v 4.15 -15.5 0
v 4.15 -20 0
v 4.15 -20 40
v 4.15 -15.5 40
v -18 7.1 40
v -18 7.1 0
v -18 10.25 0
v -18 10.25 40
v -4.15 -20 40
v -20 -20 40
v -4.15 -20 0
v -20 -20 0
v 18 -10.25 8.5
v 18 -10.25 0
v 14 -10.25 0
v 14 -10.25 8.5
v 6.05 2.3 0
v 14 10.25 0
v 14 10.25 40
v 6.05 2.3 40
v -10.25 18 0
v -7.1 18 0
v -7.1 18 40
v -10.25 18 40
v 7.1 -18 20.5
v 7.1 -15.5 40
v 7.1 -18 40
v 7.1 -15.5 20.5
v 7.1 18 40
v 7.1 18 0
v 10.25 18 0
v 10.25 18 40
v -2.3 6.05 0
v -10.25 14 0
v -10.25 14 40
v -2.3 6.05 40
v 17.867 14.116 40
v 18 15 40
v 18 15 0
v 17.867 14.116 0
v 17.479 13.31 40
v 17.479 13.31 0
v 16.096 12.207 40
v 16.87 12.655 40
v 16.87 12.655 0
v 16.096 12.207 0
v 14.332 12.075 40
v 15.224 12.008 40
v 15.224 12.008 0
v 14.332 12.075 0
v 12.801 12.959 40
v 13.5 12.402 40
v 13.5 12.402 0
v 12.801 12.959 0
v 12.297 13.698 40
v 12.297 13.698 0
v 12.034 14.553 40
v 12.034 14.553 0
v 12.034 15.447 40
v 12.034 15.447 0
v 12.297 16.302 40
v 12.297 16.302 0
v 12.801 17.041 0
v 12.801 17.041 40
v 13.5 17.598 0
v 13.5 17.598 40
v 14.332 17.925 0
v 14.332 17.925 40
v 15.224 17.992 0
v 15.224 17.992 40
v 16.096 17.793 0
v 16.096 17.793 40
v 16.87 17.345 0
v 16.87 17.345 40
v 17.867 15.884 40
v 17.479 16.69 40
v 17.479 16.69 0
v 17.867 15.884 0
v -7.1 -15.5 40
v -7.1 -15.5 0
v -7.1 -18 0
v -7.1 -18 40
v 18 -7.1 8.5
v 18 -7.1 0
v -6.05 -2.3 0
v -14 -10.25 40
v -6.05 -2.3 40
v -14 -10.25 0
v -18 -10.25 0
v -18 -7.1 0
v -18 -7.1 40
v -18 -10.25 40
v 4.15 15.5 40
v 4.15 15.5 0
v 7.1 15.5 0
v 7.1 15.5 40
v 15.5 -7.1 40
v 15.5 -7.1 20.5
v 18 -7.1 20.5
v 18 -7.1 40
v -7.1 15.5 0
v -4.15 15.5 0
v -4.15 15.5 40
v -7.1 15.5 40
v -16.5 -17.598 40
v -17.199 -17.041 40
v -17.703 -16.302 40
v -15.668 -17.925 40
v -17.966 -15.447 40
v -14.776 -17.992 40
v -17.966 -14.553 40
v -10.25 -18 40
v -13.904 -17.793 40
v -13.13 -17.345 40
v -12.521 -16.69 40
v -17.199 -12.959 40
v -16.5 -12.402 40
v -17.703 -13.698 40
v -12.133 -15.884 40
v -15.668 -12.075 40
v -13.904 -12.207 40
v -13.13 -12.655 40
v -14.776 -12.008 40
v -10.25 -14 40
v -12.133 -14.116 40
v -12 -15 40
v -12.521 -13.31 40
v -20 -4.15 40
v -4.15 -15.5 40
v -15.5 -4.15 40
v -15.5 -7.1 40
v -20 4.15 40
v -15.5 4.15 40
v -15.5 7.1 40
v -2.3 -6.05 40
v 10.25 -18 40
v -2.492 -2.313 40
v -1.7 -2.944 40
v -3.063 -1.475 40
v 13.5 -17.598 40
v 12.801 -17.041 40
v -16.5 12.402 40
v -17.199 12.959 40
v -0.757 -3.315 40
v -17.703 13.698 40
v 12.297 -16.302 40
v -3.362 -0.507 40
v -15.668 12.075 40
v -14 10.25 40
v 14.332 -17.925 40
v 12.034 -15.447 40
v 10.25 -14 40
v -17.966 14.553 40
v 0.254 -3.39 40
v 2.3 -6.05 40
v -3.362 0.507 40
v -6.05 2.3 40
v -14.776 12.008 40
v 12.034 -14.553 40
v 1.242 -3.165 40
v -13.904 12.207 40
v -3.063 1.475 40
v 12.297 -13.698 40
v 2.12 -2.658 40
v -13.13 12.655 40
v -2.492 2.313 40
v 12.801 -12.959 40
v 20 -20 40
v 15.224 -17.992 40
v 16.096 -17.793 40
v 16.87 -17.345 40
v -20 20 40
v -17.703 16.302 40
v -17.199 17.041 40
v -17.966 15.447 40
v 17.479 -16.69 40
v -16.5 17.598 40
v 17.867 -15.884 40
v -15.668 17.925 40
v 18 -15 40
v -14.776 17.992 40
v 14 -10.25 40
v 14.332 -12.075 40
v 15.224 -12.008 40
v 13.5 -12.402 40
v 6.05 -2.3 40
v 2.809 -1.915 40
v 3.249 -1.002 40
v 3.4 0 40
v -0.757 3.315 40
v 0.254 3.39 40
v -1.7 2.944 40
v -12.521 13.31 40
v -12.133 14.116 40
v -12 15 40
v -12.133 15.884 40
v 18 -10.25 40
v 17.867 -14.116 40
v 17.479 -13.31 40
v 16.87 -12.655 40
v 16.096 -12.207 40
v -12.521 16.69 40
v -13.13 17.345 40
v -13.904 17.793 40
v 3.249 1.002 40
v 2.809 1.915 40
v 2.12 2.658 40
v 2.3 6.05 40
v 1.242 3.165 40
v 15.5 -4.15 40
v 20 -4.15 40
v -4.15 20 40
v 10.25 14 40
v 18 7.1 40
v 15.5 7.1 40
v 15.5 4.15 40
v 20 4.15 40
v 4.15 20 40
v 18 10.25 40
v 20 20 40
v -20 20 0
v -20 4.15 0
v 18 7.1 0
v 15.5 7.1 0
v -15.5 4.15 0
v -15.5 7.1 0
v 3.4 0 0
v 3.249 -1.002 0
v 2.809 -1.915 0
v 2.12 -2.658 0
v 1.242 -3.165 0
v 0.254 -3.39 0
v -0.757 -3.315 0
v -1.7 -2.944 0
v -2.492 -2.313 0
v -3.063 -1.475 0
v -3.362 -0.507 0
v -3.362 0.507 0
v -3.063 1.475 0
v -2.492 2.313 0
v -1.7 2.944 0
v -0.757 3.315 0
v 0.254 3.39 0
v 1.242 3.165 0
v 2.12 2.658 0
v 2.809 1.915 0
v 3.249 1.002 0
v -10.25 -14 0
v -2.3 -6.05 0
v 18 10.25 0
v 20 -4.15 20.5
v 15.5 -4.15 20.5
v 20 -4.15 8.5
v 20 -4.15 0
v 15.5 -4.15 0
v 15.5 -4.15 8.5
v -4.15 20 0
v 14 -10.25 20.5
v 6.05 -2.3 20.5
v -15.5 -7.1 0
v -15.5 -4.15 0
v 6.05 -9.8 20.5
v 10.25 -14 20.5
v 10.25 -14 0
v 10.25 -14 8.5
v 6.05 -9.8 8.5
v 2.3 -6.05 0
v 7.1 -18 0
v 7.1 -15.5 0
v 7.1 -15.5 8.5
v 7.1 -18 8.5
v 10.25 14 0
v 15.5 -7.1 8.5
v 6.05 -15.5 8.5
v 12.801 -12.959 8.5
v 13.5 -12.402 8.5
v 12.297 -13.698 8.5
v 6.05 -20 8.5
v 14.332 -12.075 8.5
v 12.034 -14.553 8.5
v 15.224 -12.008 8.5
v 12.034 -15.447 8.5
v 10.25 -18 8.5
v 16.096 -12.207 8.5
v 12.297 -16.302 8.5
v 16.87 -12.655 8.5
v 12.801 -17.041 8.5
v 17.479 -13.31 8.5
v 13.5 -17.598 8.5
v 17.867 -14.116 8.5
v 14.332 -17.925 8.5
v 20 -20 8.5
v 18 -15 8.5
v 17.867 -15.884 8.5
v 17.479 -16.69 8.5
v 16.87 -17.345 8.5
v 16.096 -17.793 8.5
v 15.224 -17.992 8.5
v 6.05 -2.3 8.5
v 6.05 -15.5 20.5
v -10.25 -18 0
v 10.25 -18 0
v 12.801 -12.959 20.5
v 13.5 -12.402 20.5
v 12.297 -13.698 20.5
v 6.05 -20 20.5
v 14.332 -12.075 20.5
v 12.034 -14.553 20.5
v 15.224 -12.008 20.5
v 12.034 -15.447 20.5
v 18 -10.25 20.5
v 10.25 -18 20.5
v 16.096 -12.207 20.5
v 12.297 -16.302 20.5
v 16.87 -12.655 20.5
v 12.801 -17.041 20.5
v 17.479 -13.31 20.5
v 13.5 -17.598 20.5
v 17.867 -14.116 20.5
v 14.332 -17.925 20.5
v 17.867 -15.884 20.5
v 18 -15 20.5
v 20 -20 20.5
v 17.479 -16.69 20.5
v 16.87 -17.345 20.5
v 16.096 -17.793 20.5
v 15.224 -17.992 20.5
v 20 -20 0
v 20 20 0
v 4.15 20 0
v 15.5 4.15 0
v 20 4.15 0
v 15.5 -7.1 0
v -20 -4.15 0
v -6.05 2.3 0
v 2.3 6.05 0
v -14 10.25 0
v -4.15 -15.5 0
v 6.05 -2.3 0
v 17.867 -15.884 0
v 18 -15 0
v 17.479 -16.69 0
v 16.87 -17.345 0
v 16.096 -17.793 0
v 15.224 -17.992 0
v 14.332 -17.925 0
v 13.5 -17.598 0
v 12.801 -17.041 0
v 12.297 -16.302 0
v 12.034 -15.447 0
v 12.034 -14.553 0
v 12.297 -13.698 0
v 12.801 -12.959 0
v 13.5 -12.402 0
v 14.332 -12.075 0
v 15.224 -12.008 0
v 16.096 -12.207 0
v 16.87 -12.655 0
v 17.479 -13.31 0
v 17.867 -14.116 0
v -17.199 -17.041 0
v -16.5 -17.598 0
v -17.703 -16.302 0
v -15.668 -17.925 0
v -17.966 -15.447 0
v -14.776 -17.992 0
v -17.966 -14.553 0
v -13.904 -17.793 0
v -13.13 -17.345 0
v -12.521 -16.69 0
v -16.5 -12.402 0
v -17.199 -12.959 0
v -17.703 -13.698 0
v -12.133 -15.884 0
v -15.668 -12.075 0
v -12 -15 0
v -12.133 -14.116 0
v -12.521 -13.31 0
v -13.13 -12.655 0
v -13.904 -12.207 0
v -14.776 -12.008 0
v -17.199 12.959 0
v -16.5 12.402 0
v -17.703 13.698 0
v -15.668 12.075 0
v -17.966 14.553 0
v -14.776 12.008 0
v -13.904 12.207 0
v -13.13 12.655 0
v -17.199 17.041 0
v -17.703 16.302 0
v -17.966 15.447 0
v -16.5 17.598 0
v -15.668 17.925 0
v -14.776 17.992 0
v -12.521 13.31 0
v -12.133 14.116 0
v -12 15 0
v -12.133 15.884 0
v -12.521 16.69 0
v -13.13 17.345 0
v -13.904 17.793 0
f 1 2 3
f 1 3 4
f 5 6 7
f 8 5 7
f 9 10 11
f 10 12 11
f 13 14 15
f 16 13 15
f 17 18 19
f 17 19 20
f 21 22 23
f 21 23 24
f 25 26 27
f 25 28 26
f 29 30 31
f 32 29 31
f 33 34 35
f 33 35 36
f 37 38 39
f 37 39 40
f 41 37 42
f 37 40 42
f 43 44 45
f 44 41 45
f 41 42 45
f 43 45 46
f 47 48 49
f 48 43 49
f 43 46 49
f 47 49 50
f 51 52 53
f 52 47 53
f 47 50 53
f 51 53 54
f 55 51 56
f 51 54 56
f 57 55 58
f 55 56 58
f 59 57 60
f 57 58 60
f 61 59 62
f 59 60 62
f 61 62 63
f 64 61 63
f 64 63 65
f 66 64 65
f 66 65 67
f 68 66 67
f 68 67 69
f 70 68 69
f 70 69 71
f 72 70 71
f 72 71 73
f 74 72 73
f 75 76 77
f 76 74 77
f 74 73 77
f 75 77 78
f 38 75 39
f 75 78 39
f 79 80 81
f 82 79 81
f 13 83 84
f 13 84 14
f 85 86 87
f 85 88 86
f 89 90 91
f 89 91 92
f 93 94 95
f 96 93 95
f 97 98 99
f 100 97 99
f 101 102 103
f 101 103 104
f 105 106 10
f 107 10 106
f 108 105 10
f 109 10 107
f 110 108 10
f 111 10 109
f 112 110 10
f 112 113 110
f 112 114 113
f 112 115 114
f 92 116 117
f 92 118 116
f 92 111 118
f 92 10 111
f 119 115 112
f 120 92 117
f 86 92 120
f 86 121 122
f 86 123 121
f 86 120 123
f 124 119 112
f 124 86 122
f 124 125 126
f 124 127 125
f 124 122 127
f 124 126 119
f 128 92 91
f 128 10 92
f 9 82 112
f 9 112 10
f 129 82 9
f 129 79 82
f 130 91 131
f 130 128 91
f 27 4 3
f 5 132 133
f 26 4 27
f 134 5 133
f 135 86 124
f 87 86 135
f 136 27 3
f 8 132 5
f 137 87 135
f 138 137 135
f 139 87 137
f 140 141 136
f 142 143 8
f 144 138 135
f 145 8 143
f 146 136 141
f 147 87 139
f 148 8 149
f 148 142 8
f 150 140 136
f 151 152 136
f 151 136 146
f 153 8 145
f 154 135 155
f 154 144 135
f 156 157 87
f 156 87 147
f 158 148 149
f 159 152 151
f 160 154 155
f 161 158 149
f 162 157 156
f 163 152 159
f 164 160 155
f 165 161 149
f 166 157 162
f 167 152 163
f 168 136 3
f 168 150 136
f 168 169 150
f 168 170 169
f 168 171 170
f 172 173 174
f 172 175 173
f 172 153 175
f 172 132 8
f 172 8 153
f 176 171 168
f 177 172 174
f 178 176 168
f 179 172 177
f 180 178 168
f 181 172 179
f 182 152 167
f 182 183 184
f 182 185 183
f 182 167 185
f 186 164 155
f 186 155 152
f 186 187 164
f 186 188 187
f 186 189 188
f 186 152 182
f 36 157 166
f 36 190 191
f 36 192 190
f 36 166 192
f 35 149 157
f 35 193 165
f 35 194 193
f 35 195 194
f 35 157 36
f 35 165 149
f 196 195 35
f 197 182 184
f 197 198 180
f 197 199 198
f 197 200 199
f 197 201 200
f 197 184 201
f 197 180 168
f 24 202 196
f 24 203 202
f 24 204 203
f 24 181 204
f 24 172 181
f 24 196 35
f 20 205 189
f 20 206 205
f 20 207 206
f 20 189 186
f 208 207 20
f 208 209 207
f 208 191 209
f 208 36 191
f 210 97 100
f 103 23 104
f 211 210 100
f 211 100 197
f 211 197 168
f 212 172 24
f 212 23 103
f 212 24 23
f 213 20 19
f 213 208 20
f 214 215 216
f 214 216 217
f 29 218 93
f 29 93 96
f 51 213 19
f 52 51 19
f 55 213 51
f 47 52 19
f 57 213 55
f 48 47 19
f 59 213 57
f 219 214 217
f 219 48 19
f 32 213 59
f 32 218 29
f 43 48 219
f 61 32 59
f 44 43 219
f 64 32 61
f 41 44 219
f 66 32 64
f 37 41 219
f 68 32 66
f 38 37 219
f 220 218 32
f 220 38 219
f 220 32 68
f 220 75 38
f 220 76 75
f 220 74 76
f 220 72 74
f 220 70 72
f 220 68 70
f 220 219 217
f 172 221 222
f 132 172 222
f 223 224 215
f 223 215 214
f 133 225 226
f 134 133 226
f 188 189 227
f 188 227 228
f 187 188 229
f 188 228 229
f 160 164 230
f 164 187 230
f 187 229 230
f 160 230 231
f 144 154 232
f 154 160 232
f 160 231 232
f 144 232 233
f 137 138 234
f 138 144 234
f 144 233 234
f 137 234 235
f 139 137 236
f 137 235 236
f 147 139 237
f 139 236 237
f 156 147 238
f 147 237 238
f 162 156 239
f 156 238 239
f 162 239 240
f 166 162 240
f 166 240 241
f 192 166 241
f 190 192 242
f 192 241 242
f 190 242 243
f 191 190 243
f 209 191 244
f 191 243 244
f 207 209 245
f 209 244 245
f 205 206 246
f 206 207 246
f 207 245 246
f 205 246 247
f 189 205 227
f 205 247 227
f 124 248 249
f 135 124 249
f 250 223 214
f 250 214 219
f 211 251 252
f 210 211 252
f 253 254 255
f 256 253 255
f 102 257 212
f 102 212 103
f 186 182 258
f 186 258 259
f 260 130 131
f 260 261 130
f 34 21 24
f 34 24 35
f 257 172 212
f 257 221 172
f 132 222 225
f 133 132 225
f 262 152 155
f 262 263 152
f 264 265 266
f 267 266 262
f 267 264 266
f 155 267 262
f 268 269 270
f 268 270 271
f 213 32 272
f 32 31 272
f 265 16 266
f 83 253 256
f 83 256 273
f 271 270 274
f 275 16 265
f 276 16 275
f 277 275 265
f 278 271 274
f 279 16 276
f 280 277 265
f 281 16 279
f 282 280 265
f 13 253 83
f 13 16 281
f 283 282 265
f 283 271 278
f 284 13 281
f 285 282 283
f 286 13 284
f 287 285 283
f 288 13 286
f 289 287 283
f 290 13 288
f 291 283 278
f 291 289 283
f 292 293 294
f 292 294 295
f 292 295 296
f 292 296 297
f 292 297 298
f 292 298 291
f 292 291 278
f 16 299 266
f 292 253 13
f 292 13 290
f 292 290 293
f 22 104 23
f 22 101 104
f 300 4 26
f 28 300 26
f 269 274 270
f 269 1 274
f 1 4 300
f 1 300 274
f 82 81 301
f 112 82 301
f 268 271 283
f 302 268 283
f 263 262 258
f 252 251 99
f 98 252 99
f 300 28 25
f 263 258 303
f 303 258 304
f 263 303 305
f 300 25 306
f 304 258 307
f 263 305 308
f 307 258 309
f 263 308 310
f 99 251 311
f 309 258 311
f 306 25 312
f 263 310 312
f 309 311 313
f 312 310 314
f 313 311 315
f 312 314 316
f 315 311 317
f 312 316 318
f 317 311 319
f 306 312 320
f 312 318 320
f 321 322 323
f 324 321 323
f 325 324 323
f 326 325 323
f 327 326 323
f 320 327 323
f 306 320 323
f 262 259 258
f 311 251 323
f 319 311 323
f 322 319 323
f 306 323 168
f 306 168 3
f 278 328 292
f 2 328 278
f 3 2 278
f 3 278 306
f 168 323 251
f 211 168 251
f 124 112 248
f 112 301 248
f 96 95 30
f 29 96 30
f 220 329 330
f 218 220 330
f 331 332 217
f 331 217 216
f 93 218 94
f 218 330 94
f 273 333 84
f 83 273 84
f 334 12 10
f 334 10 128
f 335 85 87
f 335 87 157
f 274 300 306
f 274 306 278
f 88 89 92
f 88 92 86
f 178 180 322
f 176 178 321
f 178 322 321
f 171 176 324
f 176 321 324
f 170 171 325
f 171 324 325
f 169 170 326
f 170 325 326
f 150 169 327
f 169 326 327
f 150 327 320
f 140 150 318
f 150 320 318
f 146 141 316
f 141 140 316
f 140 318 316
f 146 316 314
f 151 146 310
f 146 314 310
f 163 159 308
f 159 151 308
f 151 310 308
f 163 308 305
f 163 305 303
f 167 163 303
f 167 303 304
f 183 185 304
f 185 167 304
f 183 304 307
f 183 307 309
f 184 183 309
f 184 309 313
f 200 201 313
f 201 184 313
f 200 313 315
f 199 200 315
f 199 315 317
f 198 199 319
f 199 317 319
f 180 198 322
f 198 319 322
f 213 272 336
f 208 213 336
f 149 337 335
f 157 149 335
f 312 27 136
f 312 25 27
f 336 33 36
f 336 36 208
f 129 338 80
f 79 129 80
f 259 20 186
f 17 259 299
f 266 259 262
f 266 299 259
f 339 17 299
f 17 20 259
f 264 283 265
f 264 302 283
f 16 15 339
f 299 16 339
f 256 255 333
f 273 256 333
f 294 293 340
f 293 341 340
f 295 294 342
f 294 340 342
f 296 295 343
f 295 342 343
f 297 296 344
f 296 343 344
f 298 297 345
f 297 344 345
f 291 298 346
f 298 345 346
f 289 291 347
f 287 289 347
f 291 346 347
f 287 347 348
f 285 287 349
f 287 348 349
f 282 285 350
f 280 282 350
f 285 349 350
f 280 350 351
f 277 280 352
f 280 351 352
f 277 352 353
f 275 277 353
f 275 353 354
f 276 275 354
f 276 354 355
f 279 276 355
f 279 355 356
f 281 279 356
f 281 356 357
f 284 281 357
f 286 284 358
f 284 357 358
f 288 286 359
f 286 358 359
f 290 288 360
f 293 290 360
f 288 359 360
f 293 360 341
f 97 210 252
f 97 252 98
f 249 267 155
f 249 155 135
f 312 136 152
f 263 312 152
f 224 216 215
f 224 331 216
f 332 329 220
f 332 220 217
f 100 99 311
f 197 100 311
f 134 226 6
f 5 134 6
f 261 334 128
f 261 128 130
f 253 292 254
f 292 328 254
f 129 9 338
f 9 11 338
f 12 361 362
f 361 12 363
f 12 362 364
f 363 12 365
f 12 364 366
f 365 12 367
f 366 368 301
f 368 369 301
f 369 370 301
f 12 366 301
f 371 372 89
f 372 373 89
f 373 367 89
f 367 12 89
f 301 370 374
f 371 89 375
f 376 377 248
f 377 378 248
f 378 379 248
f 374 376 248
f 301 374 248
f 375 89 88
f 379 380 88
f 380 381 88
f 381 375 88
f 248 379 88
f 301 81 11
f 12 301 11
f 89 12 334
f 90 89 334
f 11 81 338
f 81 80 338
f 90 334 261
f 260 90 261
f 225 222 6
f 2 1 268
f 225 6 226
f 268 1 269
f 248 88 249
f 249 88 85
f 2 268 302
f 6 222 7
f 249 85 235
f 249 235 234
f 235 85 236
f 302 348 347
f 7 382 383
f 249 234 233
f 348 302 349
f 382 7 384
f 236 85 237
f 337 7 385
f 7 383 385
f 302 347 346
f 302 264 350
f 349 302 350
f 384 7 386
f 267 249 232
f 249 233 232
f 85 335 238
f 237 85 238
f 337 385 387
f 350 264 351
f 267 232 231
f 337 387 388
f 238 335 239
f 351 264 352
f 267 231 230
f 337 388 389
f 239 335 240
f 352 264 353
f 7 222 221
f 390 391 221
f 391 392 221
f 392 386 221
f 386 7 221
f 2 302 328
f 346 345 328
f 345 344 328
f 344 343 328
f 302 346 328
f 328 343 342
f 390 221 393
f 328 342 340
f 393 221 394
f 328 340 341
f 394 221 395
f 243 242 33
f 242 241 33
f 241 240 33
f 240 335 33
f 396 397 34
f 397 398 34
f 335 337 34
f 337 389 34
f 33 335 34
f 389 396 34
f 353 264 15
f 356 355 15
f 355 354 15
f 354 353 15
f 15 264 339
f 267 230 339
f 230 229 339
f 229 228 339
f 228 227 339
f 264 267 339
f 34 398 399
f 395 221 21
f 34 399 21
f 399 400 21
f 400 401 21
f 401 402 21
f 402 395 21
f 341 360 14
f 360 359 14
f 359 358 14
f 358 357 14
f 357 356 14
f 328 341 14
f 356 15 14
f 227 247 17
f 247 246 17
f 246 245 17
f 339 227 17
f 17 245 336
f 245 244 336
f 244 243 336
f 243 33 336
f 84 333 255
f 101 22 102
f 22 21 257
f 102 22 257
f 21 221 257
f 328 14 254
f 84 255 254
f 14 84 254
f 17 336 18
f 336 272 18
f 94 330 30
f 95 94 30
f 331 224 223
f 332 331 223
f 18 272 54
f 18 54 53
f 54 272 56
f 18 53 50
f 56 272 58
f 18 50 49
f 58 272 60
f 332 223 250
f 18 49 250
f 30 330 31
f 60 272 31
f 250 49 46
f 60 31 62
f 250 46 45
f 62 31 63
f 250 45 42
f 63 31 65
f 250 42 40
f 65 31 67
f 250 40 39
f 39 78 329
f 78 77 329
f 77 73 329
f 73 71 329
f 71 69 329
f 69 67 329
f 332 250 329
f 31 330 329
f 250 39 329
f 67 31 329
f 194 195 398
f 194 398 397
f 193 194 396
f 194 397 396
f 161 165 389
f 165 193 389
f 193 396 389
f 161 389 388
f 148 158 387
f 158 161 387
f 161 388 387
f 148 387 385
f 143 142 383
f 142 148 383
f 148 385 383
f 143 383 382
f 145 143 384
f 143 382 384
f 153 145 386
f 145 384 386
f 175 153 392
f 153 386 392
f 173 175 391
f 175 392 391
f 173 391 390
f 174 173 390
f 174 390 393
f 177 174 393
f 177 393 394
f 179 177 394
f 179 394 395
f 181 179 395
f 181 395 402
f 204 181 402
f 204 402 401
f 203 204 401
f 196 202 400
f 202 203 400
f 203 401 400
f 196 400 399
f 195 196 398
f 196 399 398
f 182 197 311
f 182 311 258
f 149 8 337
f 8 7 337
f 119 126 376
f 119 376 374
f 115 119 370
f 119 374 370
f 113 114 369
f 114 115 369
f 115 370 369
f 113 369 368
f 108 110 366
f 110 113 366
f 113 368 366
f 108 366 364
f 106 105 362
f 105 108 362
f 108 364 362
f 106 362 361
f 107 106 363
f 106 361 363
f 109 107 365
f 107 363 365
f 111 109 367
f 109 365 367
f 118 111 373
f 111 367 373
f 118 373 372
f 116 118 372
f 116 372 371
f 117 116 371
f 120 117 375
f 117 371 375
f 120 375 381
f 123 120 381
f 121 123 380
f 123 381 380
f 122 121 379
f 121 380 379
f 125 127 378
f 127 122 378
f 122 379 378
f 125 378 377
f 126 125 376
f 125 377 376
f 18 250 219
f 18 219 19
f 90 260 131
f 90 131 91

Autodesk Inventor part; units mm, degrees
ref_plane "YZ Plane" through (0, 0, 0) normal (1, 0, 0) x (0, 1, 0)
ref_plane "XZ Plane" through (0, 0, 0) normal (0, 1, 0) x (-1, 0, 0)
ref_plane "XY Plane" through (0, 0, 0) normal (0, 0, 1) x (1, 0, 0)
sketch "Sketch1" plane through (0, 0, 0) normal (0, 0, 1) x (1, 0, 0)
  circle A0 centre (0, 0) radius 3.4
  line L0 (0, 0) -> (20, 20) construction
  line L1 (0, 0) -> (28.2843, 0) construction
  line L2 (20, 20) -> (4.15, 20)
  line L3 (4.15, 20) -> (4.15, 15.5)
  line L4 (4.15, 15.5) -> (7.1, 15.5)
  line L5 (7.1, 15.5) -> (7.1, 18)
  line L6 (7.1, 18) -> (10.25, 18)
  line L7 (10.25, 18) -> (10.25, 14)
  line L8 (0, 0) -> (0, 26.1056) construction
  line L9 (10.25, 14) -> (2.3, 6.05)
  line L10 (2.3, 6.05) -> (0, 6.05)
  circle A1 centre (15, 15) radius 3
  line L11 (20, 20) -> (20, 4.15)
  line L12 (20, 4.15) -> (15.5, 4.15)
  line L13 (15.5, 4.15) -> (15.5, 7.1)
  line L14 (15.5, 7.1) -> (18, 7.1)
  line L15 (18, 7.1) -> (18, 10.25)
  line L16 (18, 10.25) -> (14, 10.25)
  line L17 (14, 10.25) -> (6.05, 2.3)
  line L18 (6.05, 2.3) -> (6.05, 0)
  line L19 (-2.3, 6.05) -> (0, 6.05)
  line L20 (-10.25, 14) -> (-2.3, 6.05)
  line L21 (-10.25, 18) -> (-10.25, 14)
  line L22 (-4.15, 15.5) -> (-7.1, 15.5)
  line L23 (-7.1, 15.5) -> (-7.1, 18)
  line L24 (-7.1, 18) -> (-10.25, 18)
  line L25 (-4.15, 20) -> (-4.15, 15.5)
  line L26 (-20, 20) -> (-4.15, 20)
  circle A2 centre (-15, 15) radius 3
  line L27 (-20, 20) -> (-20, 4.15)
  line L28 (-14, 10.25) -> (-6.05, 2.3)
  line L29 (-18, 7.1) -> (-18, 10.25)
  line L30 (-18, 10.25) -> (-14, 10.25)
  line L31 (-20, 4.15) -> (-15.5, 4.15)
  line L32 (-15.5, 4.15) -> (-15.5, 7.1)
  line L33 (-15.5, 7.1) -> (-18, 7.1)
  line L34 (-6.05, 2.3) -> (-6.05, 0)
  line L35 (-6.05, -2.3) -> (-6.05, 0)
  line L36 (-14, -10.25) -> (-6.05, -2.3)
  line L37 (-18, -10.25) -> (-14, -10.25)
  line L38 (-15.5, -4.15) -> (-15.5, -7.1)
  line L39 (-15.5, -7.1) -> (-18, -7.1)
  line L40 (-18, -7.1) -> (-18, -10.25)
  line L41 (-20, -4.15) -> (-15.5, -4.15)
  line L42 (-20, -20) -> (-20, -4.15)
  circle A3 centre (-15, -15) radius 3
  line L43 (-20, -20) -> (-4.15, -20)
  line L44 (-10.25, -14) -> (-2.3, -6.05)
  line L45 (-7.1, -18) -> (-10.25, -18)
  line L46 (-10.25, -18) -> (-10.25, -14)
  line L47 (-4.15, -20) -> (-4.15, -15.5)
  line L48 (-4.15, -15.5) -> (-7.1, -15.5)
  line L49 (-7.1, -15.5) -> (-7.1, -18)
  line L50 (-2.3, -6.05) -> (0, -6.05)
  line L51 (2.3, -6.05) -> (0, -6.05)
  line L52 (10.25, -14) -> (2.3, -6.05)
  line L53 (10.25, -18) -> (10.25, -14)
  line L54 (4.15, -15.5) -> (7.1, -15.5)
  line L55 (7.1, -15.5) -> (7.1, -18)
  line L56 (7.1, -18) -> (10.25, -18)
  line L57 (4.15, -20) -> (4.15, -15.5)
  line L58 (20, -20) -> (4.15, -20)
  circle A4 centre (15, -15) radius 3
  line L59 (20, -20) -> (20, -4.15)
  line L60 (14, -10.25) -> (6.05, -2.3)
  line L61 (18, -7.1) -> (18, -10.25)
  line L62 (18, -10.25) -> (14, -10.25)
  line L63 (20, -4.15) -> (15.5, -4.15)
  line L64 (15.5, -4.15) -> (15.5, -7.1)
  line L65 (15.5, -7.1) -> (18, -7.1)
  line L66 (6.05, -2.3) -> (6.05, 0)
  point P0 (0, 6.05)
  point P1 (-6.05, 0)
  point P2 (0, -6.05)
  dimension "d0" = 6.8
  dimension "d1" = 45
  dimension "d2" = 20
  dimension "d3" = 6
  dimension "d4" = 15
  dimension "d5" = 10.25
  dimension "d6" = 7.1
  dimension "d7" = 4.15
  dimension "d8" = 4.5
  dimension "d9" = 2
  dimension "d10" = 13.95
  dimension "d11" = 6
  dimension "d14" = 360
extrude "Extrusion1" add sketch "Sketch1" along normal blind 40
sketch "Sketch3" plane through (20, -20, 0) normal (1, 0, 0) x (0, 0, -1)
  line L0 (-14.5, 15.85) -> (-14.5, 0) construction
  line L1 (-20.5, 18.85) -> (-20.5, -3)
  line L2 (-8.5, 18.85) -> (-8.5, -3)
  line L3 (0, 15.85) -> (-40, 15.85) projected
  line L4 (0, 0) -> (-40, 0) projected
  line L5 (0, 0) -> (0, 15.85) projected
  line L6 (-20.5, 18.85) -> (-8.5, 18.85)
  line L7 (-20.5, -3) -> (-8.5, -3)
  point P0 (0, 20)
  dimension "d22" = 14.5
  dimension "d23" = 12
  dimension "d24" = 3
  dimension "d25" = 3
extrude "Extrusion3" cut sketch "Sketch3" against normal up to surface (13.95 mm away) contours L6 L2 L3 L1 | L3 L2 L4 L1 | L4 L2 L7 L1
properties part number "Aluminum_Profile_4040_40.10mm_left" material "Aluminum 6061-AHC"
